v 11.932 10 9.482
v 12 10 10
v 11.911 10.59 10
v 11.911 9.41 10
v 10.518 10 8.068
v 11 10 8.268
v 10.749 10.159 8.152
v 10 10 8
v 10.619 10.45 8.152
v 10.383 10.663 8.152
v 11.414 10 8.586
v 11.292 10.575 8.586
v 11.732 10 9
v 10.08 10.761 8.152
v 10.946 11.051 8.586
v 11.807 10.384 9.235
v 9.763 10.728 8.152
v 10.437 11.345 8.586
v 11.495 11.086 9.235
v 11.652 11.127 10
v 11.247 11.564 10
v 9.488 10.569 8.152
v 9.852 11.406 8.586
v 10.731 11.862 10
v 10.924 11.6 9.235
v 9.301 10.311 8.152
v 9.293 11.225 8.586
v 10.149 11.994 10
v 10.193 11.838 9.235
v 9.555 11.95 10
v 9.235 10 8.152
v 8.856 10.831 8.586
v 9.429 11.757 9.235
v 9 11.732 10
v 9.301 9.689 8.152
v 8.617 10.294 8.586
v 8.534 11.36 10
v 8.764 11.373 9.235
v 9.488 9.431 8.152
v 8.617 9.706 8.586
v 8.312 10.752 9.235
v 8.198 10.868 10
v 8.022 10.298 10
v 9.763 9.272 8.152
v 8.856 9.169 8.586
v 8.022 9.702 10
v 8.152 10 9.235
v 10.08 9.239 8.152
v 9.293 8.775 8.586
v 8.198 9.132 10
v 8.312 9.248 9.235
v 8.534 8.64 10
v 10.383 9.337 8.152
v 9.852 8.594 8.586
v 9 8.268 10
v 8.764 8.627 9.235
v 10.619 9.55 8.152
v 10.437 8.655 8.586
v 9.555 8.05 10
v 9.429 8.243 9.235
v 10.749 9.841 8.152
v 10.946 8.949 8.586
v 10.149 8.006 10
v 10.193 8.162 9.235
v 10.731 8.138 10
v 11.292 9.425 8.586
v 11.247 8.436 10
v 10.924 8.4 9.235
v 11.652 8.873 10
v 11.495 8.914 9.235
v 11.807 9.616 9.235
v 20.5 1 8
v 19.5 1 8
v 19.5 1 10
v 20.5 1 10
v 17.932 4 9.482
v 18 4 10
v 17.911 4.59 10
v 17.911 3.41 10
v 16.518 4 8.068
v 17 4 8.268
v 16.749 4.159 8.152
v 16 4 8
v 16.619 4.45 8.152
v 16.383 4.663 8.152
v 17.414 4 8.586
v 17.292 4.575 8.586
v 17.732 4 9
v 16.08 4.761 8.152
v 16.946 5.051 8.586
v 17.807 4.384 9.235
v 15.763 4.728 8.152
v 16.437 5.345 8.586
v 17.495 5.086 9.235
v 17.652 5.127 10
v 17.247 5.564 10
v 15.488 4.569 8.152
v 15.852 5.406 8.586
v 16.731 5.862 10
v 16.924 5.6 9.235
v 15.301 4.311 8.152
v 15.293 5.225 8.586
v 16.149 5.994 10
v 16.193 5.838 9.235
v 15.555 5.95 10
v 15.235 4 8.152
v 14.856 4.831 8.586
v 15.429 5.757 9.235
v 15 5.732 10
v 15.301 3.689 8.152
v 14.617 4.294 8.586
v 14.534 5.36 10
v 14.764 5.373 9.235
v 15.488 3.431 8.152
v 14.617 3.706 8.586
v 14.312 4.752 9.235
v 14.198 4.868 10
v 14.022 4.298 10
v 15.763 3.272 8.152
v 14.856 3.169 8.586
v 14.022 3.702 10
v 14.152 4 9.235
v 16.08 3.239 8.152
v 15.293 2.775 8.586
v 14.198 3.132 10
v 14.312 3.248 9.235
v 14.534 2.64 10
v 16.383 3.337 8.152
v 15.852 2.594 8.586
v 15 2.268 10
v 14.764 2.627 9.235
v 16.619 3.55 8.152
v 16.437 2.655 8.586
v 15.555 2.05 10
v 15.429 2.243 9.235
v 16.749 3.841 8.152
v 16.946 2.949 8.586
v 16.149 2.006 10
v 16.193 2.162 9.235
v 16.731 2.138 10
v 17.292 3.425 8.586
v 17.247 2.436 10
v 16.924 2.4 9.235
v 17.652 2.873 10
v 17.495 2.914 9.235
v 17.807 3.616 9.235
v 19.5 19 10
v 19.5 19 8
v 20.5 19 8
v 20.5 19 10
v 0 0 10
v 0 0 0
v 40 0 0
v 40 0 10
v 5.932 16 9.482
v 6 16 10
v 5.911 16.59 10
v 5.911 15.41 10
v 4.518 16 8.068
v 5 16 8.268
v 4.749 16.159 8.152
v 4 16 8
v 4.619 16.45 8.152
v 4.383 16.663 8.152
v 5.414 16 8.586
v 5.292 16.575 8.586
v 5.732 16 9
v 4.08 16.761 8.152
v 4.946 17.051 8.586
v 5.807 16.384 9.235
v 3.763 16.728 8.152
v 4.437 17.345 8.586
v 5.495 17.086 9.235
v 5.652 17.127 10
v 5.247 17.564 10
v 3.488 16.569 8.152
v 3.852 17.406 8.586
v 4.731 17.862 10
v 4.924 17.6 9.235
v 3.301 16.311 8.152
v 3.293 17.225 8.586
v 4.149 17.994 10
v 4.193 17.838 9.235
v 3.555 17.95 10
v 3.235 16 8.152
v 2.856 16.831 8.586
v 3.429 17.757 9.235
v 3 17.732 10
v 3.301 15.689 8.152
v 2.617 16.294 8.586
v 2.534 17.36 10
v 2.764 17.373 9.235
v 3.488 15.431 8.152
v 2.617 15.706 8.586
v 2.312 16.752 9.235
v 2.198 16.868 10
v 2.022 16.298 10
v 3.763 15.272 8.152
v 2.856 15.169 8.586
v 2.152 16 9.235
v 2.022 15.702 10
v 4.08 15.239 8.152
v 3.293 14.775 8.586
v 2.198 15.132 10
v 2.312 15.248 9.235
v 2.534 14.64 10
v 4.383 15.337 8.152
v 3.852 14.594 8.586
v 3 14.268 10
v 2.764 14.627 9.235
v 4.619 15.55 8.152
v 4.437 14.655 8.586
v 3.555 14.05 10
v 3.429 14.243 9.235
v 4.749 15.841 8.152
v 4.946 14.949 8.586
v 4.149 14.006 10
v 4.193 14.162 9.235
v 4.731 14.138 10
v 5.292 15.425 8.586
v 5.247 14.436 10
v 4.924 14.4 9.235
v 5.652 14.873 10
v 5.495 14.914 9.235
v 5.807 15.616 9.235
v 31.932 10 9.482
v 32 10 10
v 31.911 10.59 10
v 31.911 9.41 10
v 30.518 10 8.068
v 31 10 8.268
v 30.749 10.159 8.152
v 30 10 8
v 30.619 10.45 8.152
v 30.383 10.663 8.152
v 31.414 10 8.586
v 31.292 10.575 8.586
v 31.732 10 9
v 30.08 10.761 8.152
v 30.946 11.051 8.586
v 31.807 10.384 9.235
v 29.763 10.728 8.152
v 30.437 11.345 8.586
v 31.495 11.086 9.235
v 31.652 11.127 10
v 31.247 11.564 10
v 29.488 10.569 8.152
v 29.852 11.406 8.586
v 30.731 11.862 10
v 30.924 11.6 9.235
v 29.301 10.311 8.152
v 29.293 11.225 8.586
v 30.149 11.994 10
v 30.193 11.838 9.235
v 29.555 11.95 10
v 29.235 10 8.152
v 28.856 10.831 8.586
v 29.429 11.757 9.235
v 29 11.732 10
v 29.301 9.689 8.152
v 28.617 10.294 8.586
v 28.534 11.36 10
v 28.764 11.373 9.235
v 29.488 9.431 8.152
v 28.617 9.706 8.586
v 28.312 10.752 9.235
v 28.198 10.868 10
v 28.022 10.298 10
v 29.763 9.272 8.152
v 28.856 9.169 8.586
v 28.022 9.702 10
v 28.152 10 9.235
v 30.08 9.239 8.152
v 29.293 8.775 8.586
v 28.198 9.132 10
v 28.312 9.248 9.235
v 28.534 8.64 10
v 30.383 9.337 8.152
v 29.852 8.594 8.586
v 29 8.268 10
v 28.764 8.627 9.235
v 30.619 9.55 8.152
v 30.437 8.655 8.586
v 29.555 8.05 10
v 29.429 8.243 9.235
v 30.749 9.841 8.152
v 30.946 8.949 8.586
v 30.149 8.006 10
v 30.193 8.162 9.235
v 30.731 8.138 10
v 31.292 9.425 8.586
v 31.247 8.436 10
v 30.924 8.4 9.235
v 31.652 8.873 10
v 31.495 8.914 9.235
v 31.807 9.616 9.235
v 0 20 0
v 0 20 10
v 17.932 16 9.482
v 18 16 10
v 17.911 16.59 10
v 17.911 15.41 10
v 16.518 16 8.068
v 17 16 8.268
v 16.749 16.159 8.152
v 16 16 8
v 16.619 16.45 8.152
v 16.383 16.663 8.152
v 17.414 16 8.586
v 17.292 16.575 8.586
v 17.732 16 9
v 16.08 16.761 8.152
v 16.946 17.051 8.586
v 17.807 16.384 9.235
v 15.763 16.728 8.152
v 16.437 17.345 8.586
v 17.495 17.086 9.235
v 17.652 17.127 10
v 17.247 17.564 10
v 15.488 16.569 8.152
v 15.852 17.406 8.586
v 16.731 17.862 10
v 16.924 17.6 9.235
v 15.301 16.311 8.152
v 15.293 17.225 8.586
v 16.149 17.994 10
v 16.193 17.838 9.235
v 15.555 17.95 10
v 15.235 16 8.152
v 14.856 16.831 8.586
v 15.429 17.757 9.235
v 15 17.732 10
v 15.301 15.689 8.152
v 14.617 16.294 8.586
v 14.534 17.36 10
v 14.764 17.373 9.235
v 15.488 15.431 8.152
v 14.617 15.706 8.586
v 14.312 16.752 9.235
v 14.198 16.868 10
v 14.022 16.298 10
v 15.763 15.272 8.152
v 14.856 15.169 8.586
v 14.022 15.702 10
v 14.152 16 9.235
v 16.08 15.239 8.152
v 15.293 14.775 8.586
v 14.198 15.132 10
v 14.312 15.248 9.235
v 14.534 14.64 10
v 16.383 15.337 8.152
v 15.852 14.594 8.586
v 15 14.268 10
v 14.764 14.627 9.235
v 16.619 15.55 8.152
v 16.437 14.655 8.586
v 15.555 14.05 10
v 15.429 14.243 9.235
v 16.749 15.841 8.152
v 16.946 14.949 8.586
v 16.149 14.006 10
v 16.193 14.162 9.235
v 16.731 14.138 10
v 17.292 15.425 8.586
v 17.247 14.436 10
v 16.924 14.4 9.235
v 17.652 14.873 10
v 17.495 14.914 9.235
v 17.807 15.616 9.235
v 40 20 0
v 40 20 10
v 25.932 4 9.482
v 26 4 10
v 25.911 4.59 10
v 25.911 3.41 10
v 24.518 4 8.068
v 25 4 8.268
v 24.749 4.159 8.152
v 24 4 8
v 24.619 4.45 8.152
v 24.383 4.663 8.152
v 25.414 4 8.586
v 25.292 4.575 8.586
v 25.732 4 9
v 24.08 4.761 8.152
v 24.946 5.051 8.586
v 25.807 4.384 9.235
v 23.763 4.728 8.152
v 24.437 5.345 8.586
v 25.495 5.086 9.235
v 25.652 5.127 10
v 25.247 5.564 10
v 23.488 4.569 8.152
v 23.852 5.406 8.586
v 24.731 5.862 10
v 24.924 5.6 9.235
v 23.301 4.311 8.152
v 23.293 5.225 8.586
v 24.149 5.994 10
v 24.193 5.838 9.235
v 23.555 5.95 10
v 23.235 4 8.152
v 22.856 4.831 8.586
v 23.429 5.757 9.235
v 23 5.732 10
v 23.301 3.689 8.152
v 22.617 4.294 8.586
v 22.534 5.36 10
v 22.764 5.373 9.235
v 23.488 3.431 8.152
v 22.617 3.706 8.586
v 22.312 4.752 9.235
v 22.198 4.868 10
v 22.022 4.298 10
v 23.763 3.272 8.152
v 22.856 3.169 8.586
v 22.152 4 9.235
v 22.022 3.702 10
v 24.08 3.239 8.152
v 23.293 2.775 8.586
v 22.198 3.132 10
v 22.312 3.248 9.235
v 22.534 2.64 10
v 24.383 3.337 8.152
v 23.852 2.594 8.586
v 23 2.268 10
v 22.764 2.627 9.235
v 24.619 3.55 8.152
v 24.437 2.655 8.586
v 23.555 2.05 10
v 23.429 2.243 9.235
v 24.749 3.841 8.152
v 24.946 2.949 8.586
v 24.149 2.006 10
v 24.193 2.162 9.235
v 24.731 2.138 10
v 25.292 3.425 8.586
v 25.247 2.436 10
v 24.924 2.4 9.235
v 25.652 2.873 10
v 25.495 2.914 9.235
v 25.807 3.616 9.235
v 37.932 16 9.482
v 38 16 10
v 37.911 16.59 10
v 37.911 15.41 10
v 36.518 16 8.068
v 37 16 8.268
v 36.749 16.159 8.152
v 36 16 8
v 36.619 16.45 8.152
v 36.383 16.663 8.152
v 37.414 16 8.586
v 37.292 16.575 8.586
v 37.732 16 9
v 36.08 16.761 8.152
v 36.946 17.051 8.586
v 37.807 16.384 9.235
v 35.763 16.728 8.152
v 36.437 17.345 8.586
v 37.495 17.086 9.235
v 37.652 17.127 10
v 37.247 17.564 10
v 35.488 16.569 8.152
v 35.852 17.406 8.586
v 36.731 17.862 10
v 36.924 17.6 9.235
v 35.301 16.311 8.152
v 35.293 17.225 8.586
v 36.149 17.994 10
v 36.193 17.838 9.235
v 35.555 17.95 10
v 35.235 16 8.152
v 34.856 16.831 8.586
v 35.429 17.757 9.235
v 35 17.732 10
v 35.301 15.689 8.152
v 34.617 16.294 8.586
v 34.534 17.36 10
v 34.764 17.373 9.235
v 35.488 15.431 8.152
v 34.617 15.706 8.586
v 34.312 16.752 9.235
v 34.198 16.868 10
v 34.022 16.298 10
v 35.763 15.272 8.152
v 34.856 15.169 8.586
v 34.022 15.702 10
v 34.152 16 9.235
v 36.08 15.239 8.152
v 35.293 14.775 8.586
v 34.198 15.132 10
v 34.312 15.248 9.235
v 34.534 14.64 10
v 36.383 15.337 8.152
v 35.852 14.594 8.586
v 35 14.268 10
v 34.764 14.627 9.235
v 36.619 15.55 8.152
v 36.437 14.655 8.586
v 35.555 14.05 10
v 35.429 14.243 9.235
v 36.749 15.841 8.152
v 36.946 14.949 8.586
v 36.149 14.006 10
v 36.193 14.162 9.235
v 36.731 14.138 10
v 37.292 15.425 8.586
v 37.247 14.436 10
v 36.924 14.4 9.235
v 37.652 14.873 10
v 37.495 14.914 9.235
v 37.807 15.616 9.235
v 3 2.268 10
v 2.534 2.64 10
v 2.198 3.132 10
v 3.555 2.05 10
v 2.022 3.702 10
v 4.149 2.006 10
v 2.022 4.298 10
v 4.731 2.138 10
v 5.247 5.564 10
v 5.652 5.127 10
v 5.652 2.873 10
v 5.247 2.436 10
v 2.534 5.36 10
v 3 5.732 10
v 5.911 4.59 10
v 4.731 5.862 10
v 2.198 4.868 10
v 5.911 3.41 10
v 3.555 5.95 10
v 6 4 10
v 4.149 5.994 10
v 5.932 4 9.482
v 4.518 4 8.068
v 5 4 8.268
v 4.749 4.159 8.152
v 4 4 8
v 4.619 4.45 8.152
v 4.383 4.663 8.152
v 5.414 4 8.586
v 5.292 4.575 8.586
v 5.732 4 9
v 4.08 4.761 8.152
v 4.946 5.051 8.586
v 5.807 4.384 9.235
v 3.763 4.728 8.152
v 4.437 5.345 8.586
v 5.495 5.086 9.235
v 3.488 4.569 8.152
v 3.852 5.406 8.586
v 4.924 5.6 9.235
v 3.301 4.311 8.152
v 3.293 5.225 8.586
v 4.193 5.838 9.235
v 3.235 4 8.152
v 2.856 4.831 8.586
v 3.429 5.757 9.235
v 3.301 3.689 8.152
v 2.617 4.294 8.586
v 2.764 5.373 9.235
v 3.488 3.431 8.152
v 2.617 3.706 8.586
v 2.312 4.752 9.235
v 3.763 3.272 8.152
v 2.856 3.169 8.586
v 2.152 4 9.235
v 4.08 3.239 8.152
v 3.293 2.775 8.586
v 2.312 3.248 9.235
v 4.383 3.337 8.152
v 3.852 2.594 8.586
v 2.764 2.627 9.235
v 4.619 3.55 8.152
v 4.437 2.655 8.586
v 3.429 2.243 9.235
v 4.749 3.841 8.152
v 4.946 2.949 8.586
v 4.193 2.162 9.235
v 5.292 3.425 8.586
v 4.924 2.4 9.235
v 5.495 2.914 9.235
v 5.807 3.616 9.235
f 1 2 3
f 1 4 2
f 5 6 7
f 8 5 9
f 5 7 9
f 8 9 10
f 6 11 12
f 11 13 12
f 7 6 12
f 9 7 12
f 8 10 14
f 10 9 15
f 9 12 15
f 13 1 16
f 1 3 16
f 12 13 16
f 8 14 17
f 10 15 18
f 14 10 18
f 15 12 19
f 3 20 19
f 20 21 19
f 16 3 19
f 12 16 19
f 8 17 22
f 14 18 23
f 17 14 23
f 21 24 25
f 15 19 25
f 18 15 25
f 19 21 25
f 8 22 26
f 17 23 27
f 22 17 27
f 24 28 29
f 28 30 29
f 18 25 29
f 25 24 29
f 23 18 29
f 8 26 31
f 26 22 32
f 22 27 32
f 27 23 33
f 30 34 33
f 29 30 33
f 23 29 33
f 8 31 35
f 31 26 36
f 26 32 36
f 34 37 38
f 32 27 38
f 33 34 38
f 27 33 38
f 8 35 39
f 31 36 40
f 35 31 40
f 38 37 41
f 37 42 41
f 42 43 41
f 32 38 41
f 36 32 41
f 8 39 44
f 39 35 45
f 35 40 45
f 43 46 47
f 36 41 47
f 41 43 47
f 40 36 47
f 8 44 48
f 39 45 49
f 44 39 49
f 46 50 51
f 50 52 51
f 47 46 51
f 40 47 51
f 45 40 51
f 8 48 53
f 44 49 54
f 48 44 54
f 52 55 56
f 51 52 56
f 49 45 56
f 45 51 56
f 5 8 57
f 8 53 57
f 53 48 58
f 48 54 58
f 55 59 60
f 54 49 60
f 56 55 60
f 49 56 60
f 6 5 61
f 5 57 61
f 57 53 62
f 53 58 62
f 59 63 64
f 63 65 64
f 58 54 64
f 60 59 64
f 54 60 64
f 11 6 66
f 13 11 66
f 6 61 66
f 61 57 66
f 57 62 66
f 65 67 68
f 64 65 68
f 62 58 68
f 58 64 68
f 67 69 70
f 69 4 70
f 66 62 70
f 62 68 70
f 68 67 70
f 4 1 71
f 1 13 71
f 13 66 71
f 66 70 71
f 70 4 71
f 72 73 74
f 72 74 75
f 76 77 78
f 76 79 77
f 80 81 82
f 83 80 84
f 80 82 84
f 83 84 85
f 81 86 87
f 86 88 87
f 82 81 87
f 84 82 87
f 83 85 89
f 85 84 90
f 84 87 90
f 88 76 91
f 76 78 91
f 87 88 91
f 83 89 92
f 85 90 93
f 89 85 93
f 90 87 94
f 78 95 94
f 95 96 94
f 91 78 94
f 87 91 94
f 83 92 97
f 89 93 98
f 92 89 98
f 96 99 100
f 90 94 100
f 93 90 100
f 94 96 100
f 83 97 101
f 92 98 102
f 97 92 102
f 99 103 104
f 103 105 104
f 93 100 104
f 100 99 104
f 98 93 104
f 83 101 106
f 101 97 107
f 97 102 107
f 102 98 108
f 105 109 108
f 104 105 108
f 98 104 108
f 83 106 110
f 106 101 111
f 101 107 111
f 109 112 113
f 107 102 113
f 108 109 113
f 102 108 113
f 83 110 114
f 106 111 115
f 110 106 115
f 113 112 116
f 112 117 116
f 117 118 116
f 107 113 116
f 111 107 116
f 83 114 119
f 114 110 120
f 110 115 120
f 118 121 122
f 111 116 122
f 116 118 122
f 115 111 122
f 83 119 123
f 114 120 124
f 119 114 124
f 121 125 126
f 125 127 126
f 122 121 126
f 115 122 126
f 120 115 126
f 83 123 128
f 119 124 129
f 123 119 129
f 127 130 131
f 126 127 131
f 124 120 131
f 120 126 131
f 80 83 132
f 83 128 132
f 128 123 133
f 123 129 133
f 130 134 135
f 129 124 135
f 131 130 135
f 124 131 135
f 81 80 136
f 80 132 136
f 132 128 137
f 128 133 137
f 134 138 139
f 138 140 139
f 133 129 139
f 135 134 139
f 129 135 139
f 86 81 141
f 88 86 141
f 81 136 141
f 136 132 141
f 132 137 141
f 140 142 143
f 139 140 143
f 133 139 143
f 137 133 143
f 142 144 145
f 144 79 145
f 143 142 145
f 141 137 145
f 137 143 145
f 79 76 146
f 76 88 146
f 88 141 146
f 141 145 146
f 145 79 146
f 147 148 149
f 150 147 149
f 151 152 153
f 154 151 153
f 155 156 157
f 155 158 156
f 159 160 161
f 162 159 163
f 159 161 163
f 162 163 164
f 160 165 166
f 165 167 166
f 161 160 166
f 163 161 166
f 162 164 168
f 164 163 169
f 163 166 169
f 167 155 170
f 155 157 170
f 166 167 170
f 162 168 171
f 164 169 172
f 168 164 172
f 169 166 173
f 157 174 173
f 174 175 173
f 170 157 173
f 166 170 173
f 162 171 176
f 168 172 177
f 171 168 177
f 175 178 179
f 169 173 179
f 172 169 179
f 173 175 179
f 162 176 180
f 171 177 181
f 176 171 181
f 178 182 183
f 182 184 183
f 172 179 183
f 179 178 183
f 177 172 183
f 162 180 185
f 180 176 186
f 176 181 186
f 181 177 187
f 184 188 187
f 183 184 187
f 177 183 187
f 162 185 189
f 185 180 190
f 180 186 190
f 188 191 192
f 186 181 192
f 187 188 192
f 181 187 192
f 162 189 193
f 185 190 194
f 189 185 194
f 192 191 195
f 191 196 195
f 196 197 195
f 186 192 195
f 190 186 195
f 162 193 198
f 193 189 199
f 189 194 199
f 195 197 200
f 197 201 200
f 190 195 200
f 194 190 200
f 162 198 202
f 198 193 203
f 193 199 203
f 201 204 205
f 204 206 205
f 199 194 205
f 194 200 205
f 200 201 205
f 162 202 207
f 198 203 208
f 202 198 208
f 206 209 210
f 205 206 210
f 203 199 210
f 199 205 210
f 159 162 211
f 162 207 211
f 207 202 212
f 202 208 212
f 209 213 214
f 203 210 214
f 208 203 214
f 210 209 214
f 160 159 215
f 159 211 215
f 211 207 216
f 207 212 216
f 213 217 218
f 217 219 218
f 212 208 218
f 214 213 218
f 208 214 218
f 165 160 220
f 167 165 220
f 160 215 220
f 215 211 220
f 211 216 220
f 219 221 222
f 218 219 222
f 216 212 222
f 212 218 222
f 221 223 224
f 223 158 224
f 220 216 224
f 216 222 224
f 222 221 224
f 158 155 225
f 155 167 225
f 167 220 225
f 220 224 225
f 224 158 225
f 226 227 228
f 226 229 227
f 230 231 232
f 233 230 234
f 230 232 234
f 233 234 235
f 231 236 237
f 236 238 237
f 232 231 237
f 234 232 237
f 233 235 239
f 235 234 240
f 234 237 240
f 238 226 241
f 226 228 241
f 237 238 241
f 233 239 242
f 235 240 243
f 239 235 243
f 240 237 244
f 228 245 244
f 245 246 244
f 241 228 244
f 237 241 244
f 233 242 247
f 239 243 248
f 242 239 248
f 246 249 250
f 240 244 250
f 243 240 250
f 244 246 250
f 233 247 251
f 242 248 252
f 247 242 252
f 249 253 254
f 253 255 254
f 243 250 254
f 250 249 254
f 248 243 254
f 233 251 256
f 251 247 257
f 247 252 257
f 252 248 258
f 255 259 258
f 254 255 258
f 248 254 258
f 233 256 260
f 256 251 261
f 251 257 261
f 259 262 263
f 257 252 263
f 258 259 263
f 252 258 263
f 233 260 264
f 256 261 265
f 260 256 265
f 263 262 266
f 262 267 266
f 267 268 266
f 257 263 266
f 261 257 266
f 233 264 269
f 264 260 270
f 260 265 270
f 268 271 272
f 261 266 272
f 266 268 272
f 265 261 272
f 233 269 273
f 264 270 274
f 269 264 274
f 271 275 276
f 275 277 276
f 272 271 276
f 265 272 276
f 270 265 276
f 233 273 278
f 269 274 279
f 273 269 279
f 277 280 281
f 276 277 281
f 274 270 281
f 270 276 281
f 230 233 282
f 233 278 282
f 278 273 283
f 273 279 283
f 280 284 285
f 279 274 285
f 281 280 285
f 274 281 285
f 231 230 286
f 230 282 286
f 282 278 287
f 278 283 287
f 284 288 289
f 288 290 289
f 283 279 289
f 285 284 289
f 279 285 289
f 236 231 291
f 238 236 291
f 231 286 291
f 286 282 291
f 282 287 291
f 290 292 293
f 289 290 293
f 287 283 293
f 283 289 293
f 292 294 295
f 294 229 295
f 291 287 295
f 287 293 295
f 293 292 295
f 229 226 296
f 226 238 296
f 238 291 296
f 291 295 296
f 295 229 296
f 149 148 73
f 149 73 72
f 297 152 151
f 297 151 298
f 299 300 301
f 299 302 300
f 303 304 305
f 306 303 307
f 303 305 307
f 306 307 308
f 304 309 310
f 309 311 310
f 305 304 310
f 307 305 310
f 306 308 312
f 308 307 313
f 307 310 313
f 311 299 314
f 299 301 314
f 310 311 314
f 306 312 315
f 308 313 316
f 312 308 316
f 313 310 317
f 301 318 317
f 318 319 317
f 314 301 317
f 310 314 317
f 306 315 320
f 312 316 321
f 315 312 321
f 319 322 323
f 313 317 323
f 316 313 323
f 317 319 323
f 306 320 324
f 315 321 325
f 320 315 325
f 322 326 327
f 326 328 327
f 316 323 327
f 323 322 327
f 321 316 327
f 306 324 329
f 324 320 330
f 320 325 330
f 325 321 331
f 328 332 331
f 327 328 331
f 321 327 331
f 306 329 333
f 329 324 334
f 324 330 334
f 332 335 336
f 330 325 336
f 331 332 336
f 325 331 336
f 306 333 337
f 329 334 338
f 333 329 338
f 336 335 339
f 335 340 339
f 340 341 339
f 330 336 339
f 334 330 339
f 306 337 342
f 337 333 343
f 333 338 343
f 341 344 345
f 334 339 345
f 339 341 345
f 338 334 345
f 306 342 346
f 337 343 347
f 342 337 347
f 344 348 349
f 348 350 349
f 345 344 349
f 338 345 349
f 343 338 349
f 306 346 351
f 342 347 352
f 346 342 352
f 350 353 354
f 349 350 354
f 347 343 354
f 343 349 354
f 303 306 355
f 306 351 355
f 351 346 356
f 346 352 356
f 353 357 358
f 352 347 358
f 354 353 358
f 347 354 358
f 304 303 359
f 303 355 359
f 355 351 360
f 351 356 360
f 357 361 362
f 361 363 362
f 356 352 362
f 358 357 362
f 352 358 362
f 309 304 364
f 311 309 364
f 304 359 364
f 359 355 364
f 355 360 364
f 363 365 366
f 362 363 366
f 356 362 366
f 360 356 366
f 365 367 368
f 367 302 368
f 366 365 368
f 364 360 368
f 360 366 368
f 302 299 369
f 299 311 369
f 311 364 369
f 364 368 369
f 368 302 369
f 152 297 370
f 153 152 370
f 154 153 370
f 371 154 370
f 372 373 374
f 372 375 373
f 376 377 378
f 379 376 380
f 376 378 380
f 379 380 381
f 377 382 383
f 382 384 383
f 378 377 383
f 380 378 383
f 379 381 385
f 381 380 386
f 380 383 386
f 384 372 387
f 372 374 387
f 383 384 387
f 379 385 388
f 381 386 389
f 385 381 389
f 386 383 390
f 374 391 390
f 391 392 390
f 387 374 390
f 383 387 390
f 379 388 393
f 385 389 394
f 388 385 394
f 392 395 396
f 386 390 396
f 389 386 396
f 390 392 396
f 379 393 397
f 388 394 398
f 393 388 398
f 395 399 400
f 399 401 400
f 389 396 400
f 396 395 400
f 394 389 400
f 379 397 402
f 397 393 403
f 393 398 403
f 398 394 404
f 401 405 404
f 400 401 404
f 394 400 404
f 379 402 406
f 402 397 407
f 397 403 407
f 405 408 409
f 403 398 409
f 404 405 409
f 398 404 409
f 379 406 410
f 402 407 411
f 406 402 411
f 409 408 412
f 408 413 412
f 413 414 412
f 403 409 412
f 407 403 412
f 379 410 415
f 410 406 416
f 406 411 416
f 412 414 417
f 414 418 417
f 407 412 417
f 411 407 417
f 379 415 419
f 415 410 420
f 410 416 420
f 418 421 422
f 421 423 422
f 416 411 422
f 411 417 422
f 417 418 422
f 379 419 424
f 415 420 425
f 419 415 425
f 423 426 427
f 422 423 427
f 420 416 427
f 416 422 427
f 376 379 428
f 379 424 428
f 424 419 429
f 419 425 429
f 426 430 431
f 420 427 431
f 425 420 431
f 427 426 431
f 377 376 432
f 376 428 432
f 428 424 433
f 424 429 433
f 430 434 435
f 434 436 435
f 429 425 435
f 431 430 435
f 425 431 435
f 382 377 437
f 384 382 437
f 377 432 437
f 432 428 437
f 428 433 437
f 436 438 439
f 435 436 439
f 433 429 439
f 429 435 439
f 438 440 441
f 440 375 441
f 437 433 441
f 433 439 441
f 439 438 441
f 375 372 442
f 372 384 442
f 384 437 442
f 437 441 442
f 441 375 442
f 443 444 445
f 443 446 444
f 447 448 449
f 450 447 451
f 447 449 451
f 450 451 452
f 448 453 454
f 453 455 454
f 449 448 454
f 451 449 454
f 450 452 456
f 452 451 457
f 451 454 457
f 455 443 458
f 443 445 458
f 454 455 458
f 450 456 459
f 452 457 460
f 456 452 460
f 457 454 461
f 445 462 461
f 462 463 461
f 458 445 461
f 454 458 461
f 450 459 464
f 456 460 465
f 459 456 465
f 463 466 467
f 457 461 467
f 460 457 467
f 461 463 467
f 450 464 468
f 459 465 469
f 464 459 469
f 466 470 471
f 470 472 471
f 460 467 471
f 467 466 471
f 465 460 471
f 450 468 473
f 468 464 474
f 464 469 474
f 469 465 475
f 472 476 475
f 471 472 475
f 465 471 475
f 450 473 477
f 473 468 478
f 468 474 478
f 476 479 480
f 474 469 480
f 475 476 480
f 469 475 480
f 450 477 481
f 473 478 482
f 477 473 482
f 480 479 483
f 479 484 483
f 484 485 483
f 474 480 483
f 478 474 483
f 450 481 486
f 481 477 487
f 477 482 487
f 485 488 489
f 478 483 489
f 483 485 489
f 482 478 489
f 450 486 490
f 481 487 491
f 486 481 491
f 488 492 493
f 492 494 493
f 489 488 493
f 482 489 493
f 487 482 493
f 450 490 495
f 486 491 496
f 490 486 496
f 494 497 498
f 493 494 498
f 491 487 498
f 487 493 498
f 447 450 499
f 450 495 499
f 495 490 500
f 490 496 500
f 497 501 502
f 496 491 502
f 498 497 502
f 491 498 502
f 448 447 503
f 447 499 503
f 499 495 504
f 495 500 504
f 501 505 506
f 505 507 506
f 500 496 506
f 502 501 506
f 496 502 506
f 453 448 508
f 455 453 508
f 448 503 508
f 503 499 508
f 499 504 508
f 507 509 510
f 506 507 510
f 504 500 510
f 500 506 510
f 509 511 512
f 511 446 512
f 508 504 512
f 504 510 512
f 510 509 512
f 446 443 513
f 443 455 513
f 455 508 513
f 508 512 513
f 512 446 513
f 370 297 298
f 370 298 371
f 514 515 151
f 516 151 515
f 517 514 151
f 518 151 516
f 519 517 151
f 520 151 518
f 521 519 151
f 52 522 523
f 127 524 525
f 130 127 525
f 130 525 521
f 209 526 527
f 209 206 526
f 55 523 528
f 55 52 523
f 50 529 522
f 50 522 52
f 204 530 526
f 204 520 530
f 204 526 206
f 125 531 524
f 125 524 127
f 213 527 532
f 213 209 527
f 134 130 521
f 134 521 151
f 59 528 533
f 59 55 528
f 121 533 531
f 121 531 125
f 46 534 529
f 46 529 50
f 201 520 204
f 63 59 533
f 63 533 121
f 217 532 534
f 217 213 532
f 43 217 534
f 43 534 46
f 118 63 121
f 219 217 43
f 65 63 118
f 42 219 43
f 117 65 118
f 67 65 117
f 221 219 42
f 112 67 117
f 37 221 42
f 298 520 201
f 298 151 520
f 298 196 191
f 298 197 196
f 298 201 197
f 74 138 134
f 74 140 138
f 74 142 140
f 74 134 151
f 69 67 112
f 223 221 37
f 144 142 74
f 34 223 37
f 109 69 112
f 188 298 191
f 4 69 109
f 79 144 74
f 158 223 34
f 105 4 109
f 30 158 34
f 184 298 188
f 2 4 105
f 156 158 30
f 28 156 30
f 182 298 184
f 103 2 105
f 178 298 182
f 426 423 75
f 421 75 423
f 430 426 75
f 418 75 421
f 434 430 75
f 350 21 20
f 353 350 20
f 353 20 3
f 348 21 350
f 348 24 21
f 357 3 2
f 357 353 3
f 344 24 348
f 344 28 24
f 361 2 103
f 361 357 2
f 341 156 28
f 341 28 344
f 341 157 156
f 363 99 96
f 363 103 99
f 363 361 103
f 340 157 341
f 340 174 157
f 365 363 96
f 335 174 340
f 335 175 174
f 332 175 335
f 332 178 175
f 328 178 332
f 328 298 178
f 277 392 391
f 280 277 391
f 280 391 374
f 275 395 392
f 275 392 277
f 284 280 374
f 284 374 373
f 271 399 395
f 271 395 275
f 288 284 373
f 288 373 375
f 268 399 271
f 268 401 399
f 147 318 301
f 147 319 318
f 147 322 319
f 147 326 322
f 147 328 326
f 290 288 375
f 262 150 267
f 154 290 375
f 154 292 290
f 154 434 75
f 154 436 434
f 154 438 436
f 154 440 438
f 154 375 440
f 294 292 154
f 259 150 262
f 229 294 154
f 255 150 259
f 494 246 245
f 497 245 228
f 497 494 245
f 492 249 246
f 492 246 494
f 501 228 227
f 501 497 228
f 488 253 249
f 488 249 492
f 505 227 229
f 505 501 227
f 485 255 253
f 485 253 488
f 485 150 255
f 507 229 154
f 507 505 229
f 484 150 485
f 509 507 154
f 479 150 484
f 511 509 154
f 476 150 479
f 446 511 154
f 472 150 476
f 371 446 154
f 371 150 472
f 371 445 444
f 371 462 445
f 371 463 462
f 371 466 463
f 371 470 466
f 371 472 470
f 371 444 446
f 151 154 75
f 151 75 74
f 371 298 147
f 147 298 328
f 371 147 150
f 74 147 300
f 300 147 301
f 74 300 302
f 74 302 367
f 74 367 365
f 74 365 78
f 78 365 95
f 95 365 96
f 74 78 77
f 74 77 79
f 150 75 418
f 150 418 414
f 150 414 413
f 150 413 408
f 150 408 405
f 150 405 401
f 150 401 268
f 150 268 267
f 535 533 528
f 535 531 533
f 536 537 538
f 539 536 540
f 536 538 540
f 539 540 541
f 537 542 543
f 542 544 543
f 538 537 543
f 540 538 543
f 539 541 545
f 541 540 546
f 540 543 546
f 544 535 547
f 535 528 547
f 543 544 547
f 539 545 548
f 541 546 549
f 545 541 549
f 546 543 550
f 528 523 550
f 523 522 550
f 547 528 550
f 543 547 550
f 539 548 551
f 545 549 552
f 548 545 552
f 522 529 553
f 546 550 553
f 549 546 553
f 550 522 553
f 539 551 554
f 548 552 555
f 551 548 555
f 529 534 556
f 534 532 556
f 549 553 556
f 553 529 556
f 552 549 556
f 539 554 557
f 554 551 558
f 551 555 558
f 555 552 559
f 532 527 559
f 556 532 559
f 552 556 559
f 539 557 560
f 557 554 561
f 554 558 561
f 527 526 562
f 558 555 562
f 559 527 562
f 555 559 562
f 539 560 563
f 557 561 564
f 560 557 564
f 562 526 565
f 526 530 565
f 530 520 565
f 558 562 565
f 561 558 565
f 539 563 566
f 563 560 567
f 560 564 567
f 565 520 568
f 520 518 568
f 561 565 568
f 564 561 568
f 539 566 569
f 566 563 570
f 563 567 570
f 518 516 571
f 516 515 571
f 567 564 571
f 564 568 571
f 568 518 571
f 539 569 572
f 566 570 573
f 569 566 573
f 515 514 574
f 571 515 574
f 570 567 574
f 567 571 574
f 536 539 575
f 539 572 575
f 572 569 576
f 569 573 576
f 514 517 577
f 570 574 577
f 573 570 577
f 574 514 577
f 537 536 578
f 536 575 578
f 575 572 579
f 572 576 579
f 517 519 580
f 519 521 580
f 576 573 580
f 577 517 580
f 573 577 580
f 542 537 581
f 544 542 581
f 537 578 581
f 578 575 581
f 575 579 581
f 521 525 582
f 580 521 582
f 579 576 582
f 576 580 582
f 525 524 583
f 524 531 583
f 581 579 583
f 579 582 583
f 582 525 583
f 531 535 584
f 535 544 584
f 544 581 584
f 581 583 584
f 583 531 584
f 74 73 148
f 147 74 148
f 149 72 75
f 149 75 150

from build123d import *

# Parameters (mm, degrees)
ARRAY_X_COUNT = 2
ARRAY_X_PITCH = 12
ARRAY_Y_COUNT = 2
ARRAY_Y_PITCH = 12
BOX001_W      = 1
BOX001_H      = 18
BOX001_DEPTH  = 10
BOX_W         = 40
BOX_H         = 20
BOX_DEPTH     = 10


with BuildPart() as esfera004:
    # Sphere004 → Sphere004 (revolve)
    with BuildSketch(Plane(origin=(36, 16, 10), x_dir=(1, 0, 0), z_dir=(0, -1, 0))):
        with BuildLine():
            ThreePointArc((0, -2), (2, 0), (0, 2))
            Line((0, 2), (0, -2))
        make_face()
    revolve(axis=Axis((36, 16, 10), (0, 0, 1)))


with BuildPart() as esfera003:
    # Sphere003 → Sphere003 (revolve)
    with BuildSketch(Plane(origin=(30, 10, 10), x_dir=(1, 0, 0), z_dir=(0, -1, 0))):
        with BuildLine():
            ThreePointArc((0, -2), (2, 0), (0, 2))
            Line((0, 2), (0, -2))
        make_face()
    revolve(axis=Axis((30, 10, 10), (0, 0, 1)))


with BuildPart() as esfera002:
    # Sphere002 → Sphere002 (revolve)
    with BuildSketch(Plane(origin=(24, 4, 10), x_dir=(1, 0, 0), z_dir=(0, -1, 0))):
        with BuildLine():
            ThreePointArc((0, -2), (2, 0), (0, 2))
            Line((0, 2), (0, -2))
        make_face()
    revolve(axis=Axis((24, 4, 10), (0, 0, 1)))


with BuildPart() as esfera001:
    # Sphere001 → Sphere001 (revolve)
    with BuildSketch(Plane(origin=(10, 10, 10), x_dir=(1, 0, 0), z_dir=(0, -1, 0))):
        with BuildLine():
            ThreePointArc((0, -2), (2, 0), (0, 2))
            Line((0, 2), (0, -2))
        make_face()
    revolve(axis=Axis((10, 10, 10), (0, 0, 1)))


with BuildPart() as array:
    # Sphere → Sphere (revolve)
    with BuildSketch(Plane(origin=(4, 4, 10), x_dir=(1, 0, 0), z_dir=(0, -1, 0))):
        with BuildLine():
            ThreePointArc((0, -2), (2, 0), (0, 2))
            Line((0, 2), (0, -2))
        make_face()
    revolve(axis=Axis((4, 4, 10), (0, 0, 1)))

    # Array X: Array ×2


with BuildPart() as array_1:
    add(array.part)
    with Locations(*[(i * ARRAY_X_PITCH, 0, 0) for i in range(1, ARRAY_X_COUNT)]):
        add(array.part)

    # Array Y: Array ×2


with BuildPart() as array_2:
    add(array_1.part)
    with Locations(*[(0, i * ARRAY_Y_PITCH, 0) for i in range(1, ARRAY_Y_COUNT)]):
        add(array_1.part)


with BuildPart() as linia_mig:
    # Box001 → Box001 (new body)
    with BuildSketch(Plane(origin=(19.5, 1, 8), x_dir=(1, 0, 0), z_dir=(0, 0, 1))):
        with Locations((0.5, 9)):
            Rectangle(BOX001_W, BOX001_H)
    extrude(amount=BOX001_DEPTH)


with BuildPart() as cut005:
    # Box → Box (new body)
    with BuildSketch(Plane.XY):
        with Locations((20, 10)):
            Rectangle(BOX_W, BOX_H)
    extrude(amount=BOX_DEPTH)

    # Cut: cut Linia mig
    add(linia_mig.part, mode=Mode.SUBTRACT)

    # Cut001: cut Array
    add(array_2.part, mode=Mode.SUBTRACT)

    # Cut002: cut Esfera001
    add(esfera001.part, mode=Mode.SUBTRACT)

    # Cut003: cut Esfera002
    add(esfera002.part, mode=Mode.SUBTRACT)

    # Cut004: cut Esfera003
    add(esfera003.part, mode=Mode.SUBTRACT)

    # Cut005: cut Esfera004
    add(esfera004.part, mode=Mode.SUBTRACT)


solid = cut005.part
